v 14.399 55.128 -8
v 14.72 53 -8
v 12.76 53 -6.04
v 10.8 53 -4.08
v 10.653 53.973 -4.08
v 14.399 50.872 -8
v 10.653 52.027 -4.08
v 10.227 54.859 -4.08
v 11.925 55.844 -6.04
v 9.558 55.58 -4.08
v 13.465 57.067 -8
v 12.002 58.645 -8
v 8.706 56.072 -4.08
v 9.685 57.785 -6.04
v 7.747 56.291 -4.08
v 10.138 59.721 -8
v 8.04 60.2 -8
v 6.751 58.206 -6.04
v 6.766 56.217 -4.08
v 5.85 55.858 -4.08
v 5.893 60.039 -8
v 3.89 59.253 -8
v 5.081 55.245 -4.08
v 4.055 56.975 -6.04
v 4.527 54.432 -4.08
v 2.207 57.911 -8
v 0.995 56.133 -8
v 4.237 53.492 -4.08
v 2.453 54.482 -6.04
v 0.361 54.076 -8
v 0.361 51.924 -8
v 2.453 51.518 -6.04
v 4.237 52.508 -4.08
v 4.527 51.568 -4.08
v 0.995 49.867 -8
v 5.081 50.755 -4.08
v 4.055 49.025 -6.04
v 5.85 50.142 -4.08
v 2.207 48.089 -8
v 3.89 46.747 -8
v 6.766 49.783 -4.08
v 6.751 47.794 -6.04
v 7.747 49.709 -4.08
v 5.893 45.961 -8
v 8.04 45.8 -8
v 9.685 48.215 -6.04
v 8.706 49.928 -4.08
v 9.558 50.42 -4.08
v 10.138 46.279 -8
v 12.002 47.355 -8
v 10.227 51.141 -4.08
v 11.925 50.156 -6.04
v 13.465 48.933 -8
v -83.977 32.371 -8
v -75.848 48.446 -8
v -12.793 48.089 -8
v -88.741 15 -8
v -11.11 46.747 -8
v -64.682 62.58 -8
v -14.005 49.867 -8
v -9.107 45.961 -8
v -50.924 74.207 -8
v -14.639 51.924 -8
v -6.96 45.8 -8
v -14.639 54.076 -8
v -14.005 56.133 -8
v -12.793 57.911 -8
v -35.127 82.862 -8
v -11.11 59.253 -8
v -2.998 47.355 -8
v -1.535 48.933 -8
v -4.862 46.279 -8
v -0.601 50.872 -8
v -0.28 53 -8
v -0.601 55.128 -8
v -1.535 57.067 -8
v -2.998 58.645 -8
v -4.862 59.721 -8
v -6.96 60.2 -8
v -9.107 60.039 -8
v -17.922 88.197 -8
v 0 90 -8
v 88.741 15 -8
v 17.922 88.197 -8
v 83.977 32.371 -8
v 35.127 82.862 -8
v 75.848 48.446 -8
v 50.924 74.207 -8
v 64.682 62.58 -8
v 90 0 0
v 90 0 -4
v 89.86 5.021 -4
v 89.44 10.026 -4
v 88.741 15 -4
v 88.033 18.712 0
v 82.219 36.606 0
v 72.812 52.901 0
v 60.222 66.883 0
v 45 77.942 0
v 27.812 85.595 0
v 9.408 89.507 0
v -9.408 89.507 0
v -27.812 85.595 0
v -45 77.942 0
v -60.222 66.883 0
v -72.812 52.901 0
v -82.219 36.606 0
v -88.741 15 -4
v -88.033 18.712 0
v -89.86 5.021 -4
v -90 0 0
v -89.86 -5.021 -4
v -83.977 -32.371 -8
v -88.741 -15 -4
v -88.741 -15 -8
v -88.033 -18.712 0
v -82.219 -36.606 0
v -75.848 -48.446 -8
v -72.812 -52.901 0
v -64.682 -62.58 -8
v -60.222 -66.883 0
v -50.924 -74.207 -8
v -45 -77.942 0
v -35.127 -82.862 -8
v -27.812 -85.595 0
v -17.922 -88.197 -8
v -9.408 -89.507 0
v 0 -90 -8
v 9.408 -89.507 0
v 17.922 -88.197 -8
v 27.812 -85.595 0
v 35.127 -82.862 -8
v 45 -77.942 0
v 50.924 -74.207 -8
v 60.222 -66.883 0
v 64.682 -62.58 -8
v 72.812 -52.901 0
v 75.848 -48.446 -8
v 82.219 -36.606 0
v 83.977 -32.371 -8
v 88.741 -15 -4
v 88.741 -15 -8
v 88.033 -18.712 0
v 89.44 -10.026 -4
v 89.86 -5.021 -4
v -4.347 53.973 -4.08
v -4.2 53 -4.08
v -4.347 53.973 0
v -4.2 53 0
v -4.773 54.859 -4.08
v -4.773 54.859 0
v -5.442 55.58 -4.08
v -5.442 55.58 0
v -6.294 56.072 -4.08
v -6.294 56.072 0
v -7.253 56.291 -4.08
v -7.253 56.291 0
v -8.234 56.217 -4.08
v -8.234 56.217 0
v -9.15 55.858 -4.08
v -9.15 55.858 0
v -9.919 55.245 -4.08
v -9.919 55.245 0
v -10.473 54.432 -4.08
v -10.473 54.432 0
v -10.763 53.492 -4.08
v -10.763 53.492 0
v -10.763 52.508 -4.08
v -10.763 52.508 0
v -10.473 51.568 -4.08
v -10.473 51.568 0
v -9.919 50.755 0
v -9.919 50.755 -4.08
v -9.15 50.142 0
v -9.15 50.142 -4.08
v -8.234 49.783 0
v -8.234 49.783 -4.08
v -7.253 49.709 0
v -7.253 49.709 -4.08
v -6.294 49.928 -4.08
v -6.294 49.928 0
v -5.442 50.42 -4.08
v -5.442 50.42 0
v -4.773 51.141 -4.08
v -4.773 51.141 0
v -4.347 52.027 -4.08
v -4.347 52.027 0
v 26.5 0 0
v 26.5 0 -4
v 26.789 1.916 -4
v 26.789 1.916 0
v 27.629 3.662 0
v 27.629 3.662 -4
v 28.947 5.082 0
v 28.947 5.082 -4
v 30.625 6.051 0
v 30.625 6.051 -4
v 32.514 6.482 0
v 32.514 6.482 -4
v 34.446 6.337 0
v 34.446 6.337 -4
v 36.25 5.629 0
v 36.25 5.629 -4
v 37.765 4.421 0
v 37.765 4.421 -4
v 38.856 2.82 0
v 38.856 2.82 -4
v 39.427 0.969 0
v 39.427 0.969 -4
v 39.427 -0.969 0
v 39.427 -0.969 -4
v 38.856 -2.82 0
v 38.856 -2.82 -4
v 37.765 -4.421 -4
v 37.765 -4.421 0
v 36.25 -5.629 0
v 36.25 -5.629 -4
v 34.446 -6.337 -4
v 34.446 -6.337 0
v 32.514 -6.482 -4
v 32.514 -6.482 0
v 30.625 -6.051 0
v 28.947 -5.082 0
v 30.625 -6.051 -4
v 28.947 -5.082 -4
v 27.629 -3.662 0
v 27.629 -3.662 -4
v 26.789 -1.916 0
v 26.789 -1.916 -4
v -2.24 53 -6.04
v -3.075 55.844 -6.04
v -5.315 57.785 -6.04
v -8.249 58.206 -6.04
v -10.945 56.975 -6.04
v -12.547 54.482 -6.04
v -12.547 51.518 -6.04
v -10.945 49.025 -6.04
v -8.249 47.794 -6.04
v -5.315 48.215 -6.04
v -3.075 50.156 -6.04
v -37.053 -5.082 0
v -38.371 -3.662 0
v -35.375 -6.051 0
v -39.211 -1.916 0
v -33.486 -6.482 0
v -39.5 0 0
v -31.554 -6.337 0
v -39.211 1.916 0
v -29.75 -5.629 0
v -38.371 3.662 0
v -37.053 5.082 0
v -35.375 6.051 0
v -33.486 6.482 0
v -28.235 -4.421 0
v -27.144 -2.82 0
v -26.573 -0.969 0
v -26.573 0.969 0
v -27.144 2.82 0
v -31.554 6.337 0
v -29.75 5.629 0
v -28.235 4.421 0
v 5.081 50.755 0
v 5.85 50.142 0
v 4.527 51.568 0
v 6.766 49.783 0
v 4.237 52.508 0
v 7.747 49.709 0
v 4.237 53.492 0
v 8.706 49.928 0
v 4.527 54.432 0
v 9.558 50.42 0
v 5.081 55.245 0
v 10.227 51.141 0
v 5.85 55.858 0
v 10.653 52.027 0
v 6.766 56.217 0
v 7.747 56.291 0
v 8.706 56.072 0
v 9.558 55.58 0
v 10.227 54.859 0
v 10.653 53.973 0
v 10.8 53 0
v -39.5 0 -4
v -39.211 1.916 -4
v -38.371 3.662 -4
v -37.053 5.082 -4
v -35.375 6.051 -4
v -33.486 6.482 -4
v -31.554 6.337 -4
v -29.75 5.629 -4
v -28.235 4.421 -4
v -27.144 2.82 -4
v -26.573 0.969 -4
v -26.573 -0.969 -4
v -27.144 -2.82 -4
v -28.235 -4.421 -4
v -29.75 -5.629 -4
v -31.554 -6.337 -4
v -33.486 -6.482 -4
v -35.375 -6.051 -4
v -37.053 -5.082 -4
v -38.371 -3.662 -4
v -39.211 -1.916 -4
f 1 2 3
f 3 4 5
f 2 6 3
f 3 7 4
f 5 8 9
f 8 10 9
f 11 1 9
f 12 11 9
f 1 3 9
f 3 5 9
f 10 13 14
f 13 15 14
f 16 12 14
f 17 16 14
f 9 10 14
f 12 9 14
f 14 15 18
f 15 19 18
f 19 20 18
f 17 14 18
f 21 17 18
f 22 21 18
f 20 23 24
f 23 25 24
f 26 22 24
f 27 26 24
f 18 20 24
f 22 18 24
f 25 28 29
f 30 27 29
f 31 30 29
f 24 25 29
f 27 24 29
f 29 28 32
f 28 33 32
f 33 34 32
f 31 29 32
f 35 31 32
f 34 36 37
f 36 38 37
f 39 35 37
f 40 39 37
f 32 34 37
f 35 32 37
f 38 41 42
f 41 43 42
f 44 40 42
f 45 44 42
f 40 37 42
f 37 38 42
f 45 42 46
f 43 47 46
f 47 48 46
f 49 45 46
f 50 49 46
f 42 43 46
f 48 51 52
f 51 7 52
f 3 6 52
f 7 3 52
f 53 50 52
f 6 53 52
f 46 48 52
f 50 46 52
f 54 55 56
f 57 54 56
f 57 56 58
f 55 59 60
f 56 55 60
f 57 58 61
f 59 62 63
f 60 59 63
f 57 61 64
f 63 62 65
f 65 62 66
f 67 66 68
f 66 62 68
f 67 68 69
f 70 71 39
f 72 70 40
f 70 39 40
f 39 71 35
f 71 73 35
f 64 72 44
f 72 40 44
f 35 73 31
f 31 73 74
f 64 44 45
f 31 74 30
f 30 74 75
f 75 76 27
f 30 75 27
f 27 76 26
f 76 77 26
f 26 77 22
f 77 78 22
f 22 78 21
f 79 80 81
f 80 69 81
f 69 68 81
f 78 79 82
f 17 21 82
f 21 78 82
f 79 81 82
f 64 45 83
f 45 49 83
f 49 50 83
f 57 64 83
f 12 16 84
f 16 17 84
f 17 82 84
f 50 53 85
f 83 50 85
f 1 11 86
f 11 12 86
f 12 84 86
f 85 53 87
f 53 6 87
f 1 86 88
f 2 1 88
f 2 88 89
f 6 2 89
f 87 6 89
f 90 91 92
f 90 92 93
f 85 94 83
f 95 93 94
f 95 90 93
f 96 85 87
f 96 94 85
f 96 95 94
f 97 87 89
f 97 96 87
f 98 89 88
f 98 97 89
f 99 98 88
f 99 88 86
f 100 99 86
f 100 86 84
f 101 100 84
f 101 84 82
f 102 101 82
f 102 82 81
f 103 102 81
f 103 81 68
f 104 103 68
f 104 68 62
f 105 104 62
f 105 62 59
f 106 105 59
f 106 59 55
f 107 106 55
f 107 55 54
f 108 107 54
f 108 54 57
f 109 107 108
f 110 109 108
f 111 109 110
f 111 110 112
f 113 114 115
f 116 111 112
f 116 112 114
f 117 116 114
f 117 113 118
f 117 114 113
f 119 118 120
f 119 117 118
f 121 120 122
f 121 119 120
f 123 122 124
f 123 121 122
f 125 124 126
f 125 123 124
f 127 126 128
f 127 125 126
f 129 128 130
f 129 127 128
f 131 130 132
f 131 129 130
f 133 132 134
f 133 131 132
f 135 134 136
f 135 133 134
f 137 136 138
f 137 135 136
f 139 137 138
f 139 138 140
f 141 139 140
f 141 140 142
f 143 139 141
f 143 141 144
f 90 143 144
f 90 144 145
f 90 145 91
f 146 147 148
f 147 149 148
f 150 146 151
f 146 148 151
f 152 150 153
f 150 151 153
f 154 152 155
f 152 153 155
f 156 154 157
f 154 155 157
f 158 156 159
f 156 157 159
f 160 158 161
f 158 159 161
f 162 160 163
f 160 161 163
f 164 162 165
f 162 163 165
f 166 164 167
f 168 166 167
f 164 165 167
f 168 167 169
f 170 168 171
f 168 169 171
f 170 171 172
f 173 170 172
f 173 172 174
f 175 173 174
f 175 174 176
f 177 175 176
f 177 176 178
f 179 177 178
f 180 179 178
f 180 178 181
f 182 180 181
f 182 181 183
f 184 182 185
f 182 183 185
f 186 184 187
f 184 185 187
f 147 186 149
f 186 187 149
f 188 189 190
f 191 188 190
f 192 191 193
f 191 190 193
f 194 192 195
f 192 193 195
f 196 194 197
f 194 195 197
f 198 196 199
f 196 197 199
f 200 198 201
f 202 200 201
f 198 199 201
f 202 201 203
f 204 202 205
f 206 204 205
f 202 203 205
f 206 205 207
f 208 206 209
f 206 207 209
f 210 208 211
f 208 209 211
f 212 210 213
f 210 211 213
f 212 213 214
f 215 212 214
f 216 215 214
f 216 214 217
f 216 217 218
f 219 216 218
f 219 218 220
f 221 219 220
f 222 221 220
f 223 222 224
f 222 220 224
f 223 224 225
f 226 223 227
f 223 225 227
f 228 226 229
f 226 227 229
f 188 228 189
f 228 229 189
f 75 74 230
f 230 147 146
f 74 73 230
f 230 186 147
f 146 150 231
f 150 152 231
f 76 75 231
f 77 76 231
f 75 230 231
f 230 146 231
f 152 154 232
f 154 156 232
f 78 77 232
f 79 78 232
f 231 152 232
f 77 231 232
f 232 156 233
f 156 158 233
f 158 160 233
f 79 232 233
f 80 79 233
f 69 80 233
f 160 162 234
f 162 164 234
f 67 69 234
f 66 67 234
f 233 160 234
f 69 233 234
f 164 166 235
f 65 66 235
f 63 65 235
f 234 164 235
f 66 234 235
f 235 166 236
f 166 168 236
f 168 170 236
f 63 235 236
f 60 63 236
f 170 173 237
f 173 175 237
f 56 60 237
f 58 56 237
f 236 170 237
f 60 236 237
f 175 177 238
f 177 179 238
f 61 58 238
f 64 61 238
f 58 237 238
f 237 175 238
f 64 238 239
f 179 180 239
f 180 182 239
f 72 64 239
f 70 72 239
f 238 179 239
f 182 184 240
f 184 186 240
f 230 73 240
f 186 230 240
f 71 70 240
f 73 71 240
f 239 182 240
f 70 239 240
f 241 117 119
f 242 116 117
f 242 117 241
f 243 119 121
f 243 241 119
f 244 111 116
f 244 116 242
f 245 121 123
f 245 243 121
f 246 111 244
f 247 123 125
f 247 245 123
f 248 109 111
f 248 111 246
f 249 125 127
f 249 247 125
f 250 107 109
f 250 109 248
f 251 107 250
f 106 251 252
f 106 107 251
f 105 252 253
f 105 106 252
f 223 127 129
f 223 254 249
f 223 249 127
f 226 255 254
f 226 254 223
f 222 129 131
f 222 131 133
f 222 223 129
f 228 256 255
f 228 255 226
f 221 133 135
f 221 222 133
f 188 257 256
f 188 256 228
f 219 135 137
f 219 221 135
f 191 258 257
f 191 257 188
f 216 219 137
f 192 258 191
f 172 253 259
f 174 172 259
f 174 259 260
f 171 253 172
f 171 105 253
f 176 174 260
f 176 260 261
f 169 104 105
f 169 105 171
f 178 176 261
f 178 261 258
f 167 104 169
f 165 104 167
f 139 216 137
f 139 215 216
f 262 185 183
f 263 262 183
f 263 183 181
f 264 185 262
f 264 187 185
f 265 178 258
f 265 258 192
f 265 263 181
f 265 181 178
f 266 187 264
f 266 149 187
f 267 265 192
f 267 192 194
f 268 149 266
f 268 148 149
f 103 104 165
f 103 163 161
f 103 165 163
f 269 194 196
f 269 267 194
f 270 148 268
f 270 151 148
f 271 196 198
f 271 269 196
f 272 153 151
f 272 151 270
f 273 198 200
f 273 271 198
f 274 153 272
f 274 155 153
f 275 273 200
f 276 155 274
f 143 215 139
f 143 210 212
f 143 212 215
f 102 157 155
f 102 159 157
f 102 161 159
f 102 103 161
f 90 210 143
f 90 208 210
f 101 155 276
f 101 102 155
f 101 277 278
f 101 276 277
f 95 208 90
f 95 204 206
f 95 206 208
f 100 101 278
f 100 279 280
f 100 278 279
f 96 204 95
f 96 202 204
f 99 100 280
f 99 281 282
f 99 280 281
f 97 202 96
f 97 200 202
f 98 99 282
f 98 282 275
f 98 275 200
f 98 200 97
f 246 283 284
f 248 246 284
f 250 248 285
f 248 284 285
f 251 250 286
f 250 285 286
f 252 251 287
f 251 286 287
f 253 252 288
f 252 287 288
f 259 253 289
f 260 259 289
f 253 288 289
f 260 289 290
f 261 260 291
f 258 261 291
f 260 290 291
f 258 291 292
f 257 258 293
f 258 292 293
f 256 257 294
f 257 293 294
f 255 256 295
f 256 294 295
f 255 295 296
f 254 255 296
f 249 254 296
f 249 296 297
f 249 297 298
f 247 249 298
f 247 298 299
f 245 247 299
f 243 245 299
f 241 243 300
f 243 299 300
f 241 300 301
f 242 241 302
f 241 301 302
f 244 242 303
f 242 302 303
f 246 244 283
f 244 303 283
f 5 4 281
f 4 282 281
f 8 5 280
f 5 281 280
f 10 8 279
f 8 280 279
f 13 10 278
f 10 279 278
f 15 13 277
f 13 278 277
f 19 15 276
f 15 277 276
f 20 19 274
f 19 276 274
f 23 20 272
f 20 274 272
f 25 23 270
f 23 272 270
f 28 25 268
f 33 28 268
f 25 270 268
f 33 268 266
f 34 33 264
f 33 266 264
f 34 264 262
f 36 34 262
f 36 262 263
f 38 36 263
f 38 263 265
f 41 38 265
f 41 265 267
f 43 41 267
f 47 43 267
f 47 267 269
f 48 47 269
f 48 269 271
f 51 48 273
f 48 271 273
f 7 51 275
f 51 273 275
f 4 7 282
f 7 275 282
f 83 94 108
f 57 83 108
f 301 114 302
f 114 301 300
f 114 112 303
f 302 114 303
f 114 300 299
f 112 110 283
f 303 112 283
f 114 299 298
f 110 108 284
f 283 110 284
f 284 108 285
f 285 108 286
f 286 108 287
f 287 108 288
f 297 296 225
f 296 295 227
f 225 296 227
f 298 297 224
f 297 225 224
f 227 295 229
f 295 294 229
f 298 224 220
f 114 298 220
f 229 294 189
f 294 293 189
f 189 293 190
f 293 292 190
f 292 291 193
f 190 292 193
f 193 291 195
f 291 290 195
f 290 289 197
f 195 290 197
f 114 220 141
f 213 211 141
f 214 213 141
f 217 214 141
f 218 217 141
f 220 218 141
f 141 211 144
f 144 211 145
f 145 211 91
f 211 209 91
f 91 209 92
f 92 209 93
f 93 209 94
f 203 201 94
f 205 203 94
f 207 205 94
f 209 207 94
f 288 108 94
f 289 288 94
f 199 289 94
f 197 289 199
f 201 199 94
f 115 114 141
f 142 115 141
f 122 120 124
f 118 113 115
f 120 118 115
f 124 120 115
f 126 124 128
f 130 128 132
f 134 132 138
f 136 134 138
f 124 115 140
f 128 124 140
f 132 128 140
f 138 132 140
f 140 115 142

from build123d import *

# Parameters (mm, degrees)
ESBO_O1_R                                           = 90
FLANGE_BASE2_DEPTH                                  = 8
CORTE_EXTRUS_O3_START                               = -4
CORTE_EXTRUS_O3_DEPTH                               = 4
ESBO_O13_R                                          = 6.5
CORTE_EXTRUS_O4_DEPTH                               = 4
ESCAREADO_PARA_PARAFUSO_ALLEN_SEXTAVADO_D           = 6.6
ESCAREADO_PARA_PARAFUSO_ALLEN_SEXTAVADO_CSINK_D     = 14.44
ESCAREADO_PARA_PARAFUSO_ALLEN_SEXTAVADO_CSINK_ANGLE = 90


# Sheet-metal steps are written as plain solids
with BuildPart() as part:
    # Esboço1 → Flange-base2 (new body)
    with BuildSketch(Plane.XY):
        Circle(ESBO_O1_R)
    extrude(amount=-FLANGE_BASE2_DEPTH)

    # Esboço12 → Corte-extrusão3 (cut)
    with BuildSketch(Plane(origin=(0, 0, -8), x_dir=(-1, 0, 0), z_dir=(0, 0, -1)).offset(CORTE_EXTRUS_O3_START)):
        with BuildLine():
            Line((-88.741196746, 15), (88.741196746, 15))
            ThreePointArc((88.741196746, 15), (90, 0), (88.741196746, -15))
            Line((88.741196746, -15), (-88.741196746, -15))
            ThreePointArc((-88.741196746, -15), (-90, 0), (-88.741196746, 15))
        make_face()
    extrude(amount=CORTE_EXTRUS_O3_DEPTH, mode=Mode.SUBTRACT)

    # Esboço13 → Corte-extrusão4 (cut)
    with BuildSketch(Plane(origin=(0, 0, -4), x_dir=(-1, 0, 0), z_dir=(0, 0, -1))):
        with Locations((33, 0)):
            Circle(ESBO_O13_R)
        with Locations((-33, 0)):
            Circle(ESBO_O13_R)
    extrude(amount=-CORTE_EXTRUS_O4_DEPTH, mode=Mode.SUBTRACT)

    # Escareado para parafuso Allen sextavado escareado de M63 (through all)
    with Locations(Plane(origin=(0, 0, -8), x_dir=(-1, 0, 0), z_dir=(0, 0, -1))):
        with Locations((-7.5, 53), (7.5, 53)):
            CounterSinkHole(ESCAREADO_PARA_PARAFUSO_ALLEN_SEXTAVADO_D / 2, ESCAREADO_PARA_PARAFUSO_ALLEN_SEXTAVADO_CSINK_D / 2, counter_sink_angle=ESCAREADO_PARA_PARAFUSO_ALLEN_SEXTAVADO_CSINK_ANGLE)


solid = part.part
